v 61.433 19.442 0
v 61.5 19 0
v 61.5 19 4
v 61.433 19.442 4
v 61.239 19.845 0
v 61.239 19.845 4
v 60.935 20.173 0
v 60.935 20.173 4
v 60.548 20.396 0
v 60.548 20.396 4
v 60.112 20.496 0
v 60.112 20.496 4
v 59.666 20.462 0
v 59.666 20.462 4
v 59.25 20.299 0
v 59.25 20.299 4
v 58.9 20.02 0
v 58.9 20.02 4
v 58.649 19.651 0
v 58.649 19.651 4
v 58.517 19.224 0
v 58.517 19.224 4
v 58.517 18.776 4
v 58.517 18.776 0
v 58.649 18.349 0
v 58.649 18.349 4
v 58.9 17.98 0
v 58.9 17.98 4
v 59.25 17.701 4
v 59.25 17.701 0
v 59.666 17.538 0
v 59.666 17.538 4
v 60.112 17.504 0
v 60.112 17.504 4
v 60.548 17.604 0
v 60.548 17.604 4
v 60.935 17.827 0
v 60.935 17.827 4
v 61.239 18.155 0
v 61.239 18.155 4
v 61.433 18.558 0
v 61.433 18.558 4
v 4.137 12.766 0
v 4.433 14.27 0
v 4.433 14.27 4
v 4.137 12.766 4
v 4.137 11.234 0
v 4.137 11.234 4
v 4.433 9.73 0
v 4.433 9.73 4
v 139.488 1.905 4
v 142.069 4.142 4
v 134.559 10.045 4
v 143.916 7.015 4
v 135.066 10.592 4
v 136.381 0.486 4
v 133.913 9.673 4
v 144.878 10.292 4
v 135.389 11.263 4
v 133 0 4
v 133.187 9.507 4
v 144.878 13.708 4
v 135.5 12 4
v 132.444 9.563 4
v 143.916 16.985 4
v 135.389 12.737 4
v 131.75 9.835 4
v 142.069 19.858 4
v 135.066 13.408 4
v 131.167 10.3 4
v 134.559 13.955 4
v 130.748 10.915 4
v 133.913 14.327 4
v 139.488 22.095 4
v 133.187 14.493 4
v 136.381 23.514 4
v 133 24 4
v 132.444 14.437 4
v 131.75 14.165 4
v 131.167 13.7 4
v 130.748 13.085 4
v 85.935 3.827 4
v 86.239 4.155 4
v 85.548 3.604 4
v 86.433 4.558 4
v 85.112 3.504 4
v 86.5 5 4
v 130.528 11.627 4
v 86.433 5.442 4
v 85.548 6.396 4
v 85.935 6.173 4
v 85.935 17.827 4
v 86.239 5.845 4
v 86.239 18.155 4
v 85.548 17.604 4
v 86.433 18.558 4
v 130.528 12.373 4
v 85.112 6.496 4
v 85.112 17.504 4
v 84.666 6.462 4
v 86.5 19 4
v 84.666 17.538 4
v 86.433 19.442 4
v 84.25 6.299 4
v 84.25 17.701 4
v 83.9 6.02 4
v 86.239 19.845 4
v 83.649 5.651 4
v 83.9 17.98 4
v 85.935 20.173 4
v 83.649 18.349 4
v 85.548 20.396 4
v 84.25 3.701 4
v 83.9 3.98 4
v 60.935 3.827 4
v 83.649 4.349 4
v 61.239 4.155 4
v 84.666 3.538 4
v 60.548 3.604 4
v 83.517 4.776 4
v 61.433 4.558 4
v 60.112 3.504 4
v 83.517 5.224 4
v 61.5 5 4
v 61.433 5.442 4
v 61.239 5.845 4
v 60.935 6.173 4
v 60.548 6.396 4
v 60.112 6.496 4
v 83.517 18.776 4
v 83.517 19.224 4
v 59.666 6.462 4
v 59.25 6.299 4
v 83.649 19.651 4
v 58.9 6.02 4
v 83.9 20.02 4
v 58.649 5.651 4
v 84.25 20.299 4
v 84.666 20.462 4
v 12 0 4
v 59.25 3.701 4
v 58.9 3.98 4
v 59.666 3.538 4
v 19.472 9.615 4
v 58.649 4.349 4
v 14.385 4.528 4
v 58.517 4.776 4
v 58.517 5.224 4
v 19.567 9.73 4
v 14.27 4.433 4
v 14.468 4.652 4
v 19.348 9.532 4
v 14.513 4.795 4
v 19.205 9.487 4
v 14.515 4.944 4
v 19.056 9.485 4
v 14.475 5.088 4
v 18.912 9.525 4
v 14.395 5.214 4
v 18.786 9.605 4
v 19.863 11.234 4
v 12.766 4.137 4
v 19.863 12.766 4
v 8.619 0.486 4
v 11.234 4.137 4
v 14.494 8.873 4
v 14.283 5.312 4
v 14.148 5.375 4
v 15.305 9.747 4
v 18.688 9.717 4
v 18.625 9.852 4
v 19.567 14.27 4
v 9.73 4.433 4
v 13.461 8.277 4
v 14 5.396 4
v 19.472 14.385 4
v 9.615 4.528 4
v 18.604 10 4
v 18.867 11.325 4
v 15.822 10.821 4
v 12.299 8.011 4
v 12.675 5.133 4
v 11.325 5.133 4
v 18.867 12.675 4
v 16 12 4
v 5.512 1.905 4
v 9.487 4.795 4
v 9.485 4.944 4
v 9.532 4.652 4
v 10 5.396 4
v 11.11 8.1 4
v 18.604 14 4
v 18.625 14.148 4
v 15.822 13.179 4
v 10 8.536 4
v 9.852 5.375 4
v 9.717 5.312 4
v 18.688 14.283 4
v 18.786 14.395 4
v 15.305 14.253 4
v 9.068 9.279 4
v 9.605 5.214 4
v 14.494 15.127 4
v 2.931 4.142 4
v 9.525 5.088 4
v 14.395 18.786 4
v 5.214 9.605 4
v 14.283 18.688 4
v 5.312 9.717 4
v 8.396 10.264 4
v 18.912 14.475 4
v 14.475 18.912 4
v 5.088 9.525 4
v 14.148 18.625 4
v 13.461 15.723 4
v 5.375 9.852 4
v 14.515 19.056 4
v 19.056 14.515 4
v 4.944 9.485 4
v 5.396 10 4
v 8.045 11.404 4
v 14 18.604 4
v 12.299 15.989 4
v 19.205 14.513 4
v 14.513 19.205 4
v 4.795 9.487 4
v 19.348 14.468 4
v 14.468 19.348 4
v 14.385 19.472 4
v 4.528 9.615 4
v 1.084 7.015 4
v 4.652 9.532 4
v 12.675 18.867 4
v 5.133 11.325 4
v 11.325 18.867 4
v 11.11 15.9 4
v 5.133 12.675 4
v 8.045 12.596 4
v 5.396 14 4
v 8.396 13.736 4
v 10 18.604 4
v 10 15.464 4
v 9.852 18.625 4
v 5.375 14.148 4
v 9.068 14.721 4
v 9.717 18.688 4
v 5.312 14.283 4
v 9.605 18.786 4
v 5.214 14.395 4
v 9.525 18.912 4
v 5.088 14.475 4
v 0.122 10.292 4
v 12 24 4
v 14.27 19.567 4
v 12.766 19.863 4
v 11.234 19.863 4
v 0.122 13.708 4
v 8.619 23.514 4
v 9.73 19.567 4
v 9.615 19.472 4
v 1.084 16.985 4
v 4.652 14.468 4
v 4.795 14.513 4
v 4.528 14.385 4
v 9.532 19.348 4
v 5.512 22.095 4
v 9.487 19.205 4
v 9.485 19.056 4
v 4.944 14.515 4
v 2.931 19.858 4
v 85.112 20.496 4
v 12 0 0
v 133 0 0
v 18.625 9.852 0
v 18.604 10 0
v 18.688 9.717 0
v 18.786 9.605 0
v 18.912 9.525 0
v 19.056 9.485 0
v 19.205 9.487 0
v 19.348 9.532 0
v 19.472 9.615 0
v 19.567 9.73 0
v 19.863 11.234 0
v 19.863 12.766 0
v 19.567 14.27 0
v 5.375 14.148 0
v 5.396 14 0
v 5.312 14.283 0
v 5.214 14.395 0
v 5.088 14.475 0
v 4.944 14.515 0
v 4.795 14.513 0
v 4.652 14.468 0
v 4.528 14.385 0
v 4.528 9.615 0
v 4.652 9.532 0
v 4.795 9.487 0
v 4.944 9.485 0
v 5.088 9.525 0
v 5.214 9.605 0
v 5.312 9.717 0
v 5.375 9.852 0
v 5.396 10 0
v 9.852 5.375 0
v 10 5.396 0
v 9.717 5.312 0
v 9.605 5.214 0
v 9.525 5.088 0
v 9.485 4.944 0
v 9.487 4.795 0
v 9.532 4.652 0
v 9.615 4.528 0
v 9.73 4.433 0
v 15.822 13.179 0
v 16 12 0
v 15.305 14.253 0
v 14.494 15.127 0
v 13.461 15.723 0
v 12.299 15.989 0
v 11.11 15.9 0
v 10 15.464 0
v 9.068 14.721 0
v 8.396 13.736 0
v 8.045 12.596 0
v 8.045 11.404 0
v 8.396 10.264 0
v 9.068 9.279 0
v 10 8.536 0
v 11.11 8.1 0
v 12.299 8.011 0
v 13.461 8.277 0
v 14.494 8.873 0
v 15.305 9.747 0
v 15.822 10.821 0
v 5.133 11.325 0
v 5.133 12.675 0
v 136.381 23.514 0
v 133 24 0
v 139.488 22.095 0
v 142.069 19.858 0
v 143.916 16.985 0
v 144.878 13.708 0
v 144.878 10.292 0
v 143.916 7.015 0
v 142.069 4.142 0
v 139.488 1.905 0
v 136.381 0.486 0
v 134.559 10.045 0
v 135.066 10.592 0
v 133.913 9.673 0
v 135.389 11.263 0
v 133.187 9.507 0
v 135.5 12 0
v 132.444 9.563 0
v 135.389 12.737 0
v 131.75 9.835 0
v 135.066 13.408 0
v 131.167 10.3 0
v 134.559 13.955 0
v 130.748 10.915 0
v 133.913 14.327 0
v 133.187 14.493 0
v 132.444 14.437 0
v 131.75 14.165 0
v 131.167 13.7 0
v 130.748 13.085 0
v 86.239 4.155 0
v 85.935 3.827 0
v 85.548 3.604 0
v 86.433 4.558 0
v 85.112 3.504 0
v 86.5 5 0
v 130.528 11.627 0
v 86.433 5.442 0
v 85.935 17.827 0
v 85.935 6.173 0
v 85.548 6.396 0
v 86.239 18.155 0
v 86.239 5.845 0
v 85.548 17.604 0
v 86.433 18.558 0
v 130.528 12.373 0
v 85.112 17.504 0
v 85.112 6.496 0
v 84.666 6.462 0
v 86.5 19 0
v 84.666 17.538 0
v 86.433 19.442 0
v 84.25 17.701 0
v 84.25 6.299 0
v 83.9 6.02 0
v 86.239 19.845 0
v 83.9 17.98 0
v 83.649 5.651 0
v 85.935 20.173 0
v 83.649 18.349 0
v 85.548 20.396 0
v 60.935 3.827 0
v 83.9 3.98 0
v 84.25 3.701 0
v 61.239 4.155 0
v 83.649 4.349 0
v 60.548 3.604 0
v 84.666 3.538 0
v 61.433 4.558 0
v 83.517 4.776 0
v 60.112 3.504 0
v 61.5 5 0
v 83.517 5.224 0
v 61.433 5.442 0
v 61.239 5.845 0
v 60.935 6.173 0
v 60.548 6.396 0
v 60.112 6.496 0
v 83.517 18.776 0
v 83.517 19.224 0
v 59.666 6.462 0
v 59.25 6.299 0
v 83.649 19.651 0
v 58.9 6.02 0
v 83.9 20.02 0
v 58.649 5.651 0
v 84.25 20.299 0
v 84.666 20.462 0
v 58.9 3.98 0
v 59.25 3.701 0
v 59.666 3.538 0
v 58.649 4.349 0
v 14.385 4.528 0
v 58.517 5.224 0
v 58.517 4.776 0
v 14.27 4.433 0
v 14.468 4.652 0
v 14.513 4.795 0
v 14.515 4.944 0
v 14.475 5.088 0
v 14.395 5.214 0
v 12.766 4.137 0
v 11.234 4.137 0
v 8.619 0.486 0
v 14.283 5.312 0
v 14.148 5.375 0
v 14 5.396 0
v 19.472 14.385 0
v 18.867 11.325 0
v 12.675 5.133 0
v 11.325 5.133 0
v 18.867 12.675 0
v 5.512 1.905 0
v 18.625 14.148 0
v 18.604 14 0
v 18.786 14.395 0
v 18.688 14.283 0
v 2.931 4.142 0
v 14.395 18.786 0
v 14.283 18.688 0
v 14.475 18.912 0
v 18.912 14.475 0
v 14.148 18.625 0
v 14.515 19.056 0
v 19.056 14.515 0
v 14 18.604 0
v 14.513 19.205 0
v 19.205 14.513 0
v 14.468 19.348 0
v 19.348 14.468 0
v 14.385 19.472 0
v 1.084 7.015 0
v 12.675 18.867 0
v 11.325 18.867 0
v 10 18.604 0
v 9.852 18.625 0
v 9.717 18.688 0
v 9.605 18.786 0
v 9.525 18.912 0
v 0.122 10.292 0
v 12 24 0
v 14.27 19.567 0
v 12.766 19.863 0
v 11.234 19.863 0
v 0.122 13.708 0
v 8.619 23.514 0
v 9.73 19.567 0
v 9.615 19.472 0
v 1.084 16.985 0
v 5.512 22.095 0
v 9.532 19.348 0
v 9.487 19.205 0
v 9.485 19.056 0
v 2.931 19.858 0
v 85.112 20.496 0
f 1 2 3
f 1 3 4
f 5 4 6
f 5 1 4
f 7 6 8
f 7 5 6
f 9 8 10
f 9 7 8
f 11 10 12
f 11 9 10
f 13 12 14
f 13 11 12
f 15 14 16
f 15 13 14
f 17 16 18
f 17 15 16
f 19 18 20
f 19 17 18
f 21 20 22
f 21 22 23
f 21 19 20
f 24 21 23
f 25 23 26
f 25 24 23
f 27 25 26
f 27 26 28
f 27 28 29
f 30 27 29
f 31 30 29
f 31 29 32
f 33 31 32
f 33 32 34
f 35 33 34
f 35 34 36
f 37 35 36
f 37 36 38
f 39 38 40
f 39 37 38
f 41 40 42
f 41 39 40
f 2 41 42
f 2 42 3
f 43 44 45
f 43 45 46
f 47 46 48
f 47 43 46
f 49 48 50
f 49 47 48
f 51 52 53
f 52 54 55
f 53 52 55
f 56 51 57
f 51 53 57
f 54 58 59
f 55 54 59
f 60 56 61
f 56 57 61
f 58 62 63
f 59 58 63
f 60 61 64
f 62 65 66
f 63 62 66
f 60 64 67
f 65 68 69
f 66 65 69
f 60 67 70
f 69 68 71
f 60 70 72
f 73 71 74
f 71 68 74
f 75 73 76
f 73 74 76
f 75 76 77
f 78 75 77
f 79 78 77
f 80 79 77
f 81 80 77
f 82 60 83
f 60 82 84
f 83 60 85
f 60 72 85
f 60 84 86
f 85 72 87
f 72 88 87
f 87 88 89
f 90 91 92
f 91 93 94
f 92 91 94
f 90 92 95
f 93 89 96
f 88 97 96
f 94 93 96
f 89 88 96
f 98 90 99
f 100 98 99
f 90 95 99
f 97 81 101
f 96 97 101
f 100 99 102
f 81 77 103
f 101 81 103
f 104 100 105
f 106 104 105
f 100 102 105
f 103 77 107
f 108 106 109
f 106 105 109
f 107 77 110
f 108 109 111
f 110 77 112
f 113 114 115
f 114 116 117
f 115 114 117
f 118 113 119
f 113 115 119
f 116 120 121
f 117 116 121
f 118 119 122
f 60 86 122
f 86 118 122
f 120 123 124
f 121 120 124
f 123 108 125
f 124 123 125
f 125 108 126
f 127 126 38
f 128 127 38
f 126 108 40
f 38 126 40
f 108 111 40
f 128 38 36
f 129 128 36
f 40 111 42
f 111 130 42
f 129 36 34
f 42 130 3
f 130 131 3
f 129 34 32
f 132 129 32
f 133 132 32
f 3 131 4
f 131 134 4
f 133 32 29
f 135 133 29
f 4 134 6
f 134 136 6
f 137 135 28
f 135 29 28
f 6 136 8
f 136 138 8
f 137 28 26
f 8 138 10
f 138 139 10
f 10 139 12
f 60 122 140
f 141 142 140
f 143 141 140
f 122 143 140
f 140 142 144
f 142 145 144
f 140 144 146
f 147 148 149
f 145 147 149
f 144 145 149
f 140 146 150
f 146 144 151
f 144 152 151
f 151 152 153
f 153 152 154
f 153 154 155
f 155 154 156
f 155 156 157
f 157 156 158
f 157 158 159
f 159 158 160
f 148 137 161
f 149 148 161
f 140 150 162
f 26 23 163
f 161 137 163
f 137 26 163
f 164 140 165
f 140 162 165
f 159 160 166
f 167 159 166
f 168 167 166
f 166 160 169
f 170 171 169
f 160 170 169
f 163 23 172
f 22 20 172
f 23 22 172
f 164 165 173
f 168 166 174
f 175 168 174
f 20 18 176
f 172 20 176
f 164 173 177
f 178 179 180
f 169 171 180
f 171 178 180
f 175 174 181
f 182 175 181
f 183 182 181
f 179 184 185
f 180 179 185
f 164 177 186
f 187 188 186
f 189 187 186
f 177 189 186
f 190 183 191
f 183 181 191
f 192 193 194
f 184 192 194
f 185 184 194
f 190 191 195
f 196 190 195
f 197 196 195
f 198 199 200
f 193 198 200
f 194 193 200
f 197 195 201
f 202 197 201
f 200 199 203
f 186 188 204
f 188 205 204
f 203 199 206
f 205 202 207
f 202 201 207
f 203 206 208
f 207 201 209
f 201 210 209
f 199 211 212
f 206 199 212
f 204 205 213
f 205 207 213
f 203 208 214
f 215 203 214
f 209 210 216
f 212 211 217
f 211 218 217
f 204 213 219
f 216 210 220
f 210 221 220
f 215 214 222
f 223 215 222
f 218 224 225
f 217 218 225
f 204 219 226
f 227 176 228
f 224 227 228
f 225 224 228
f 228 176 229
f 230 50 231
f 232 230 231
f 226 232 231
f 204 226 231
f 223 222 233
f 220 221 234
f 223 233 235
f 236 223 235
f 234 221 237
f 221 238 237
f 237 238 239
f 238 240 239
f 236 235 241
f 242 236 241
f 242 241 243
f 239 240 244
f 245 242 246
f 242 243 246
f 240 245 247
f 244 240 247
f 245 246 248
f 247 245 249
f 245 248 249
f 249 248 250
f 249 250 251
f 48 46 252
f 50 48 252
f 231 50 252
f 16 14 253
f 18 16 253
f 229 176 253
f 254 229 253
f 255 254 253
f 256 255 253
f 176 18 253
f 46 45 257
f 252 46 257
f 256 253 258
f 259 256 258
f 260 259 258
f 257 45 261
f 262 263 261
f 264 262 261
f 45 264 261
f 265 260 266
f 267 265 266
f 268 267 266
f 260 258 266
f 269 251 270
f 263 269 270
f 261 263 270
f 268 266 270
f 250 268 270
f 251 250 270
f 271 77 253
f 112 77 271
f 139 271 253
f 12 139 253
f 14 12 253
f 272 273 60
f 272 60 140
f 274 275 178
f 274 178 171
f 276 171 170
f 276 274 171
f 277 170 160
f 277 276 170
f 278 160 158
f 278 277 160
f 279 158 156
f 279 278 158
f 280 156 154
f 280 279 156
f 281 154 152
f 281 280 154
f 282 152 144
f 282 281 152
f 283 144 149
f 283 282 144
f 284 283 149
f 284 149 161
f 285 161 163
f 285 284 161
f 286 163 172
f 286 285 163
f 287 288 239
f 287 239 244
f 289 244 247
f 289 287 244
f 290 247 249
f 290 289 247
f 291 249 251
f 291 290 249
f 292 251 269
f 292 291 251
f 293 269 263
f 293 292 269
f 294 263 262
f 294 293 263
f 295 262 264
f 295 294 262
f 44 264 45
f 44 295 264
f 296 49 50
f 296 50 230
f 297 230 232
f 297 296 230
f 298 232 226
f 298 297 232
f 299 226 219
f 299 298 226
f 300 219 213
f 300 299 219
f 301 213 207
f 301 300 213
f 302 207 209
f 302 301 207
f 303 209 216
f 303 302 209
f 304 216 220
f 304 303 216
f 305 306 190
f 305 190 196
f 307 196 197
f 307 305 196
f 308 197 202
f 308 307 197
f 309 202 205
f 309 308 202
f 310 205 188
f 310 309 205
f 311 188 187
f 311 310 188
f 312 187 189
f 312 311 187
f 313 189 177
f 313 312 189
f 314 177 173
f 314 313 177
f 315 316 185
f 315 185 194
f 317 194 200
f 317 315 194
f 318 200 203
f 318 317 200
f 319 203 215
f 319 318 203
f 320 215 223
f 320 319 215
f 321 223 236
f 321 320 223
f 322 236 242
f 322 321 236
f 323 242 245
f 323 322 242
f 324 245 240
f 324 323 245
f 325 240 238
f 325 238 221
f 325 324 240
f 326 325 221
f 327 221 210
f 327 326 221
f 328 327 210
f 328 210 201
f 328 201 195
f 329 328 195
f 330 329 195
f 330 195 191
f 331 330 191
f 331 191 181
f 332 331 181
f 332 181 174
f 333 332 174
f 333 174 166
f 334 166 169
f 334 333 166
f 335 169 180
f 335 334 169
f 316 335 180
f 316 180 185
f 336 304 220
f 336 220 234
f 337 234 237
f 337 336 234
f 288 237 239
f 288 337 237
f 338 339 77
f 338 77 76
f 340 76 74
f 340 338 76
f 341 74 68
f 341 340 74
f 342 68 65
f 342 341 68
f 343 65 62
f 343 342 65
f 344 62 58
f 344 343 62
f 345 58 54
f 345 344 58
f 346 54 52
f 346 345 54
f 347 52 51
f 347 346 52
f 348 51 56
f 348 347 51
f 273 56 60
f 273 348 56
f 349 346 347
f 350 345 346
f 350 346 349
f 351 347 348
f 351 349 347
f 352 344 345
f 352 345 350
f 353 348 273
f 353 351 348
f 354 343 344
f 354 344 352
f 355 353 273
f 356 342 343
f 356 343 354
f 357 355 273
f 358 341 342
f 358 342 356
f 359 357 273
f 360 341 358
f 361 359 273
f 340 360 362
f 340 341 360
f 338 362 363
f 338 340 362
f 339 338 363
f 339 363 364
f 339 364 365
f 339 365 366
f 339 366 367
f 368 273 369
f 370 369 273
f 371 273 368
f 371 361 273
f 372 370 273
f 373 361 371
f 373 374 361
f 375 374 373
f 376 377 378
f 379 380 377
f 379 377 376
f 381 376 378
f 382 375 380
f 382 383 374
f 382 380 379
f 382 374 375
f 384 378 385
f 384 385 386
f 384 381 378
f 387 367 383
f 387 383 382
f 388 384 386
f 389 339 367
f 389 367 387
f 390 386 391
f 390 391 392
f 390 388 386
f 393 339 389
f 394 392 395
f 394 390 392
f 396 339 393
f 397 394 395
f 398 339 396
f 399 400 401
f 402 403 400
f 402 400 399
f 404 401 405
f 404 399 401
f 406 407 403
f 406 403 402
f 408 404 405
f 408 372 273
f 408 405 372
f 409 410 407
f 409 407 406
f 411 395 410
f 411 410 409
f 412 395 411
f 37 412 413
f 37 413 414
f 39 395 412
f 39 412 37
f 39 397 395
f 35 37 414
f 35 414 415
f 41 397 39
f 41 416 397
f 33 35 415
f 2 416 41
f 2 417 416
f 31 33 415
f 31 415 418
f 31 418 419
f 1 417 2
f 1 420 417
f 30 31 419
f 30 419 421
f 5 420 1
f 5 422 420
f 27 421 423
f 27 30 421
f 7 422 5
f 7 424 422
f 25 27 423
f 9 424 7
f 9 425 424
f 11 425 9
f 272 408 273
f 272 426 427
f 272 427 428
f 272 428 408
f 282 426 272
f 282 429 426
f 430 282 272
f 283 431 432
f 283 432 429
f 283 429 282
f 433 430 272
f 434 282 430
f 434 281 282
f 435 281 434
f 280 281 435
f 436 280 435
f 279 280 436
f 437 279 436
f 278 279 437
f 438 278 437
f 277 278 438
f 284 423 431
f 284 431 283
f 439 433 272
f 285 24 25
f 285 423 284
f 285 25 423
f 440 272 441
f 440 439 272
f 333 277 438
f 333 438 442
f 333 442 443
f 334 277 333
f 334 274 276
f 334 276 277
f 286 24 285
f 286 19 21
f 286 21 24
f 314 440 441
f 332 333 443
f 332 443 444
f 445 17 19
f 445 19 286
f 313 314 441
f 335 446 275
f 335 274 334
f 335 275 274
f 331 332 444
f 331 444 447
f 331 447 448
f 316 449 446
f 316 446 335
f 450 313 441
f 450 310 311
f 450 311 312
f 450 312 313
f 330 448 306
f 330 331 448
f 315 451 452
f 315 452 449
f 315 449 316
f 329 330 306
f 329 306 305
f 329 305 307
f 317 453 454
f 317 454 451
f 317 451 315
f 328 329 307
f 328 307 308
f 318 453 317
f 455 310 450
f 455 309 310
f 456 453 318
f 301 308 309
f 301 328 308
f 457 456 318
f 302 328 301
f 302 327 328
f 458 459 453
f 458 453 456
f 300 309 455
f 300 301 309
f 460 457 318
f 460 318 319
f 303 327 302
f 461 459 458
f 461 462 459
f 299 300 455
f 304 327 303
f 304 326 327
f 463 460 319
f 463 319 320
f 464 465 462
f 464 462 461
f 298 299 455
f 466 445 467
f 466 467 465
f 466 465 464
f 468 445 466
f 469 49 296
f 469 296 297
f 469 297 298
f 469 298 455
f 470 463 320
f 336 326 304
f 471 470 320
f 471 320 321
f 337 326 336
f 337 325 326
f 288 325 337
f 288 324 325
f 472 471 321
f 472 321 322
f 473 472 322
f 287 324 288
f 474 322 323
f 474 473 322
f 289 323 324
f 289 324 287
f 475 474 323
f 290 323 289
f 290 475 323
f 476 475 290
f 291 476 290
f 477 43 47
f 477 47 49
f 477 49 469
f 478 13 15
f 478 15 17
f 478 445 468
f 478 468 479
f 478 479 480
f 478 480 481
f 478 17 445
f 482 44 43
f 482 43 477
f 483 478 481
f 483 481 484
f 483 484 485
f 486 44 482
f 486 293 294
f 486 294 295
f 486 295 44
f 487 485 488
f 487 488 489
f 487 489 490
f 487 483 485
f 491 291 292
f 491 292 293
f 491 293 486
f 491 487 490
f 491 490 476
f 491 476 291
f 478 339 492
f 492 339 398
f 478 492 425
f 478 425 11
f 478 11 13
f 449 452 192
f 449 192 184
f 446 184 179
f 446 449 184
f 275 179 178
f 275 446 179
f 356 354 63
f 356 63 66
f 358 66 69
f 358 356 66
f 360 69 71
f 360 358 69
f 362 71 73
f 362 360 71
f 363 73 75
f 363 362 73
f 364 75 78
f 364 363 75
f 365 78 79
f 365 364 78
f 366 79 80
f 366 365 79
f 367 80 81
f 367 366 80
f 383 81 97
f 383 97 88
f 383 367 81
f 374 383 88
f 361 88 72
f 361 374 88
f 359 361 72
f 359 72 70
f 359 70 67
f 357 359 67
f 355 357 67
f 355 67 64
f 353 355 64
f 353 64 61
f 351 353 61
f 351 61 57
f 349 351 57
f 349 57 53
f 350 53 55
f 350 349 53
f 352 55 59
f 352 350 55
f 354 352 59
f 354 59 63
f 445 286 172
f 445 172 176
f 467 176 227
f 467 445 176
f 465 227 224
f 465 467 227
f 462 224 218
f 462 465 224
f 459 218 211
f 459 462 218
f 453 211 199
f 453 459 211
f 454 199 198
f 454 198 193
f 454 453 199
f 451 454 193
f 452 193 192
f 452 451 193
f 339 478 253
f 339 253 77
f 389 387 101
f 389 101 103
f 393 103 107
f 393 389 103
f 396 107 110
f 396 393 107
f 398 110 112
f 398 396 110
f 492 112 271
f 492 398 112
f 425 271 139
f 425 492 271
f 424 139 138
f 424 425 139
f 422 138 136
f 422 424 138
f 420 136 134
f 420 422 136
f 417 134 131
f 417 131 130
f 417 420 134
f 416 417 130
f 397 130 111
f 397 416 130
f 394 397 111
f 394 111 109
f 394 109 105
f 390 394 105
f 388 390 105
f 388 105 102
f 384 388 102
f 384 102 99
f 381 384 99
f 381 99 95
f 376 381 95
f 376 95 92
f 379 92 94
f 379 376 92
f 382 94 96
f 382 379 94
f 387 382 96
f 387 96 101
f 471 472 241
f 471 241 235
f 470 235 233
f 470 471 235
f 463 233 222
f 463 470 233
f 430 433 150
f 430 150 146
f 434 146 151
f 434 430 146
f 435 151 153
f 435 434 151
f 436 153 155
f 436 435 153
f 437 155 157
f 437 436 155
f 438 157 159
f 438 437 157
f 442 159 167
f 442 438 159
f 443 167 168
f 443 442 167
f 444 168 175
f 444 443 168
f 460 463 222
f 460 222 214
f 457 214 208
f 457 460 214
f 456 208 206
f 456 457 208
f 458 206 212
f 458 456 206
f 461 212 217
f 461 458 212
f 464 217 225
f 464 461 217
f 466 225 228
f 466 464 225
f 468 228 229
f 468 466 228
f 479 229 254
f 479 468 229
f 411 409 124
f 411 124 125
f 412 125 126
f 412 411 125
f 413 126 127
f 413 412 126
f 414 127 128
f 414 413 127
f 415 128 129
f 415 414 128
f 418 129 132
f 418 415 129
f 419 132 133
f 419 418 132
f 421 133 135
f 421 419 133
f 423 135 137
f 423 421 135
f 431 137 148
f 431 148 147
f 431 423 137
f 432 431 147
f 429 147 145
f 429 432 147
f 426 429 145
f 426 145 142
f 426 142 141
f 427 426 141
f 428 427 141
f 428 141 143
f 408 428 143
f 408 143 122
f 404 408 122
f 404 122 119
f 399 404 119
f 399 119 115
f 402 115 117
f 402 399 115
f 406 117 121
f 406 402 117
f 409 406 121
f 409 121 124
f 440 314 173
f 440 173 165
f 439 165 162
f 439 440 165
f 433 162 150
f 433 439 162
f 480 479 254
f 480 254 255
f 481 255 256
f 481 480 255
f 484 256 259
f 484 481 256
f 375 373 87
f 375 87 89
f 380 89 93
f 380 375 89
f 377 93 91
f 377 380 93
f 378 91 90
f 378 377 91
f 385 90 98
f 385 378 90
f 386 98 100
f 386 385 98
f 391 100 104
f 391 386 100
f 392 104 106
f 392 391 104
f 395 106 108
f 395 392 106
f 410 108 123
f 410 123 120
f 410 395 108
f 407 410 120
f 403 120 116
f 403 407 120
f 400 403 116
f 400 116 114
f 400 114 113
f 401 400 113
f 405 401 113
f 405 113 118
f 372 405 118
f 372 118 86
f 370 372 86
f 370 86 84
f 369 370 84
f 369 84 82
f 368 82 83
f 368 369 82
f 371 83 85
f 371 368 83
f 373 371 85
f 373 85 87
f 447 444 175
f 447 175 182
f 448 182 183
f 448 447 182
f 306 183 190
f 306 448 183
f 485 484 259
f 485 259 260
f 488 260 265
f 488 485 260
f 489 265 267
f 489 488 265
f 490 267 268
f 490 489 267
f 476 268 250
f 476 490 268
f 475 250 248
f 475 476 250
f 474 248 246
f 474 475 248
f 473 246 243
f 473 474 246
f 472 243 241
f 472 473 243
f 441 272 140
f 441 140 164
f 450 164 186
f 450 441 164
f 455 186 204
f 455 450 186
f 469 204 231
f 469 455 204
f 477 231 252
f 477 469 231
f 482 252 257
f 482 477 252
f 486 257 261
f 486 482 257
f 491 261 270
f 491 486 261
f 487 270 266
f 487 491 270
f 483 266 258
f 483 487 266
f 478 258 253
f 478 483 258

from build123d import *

# Parameters (mm, degrees)
SKETCH1_R           = 4
SKETCH1_R_2         = 1.5
SKETCH1_R_3         = 2.5
BOSS_EXTRUDE1_DEPTH = 4


with BuildPart() as part:
    # Sketch1 → Boss-Extrude1 (new body)
    with BuildSketch(Plane.XY):
        with BuildLine():
            Line((12.000000461, 24.00000011), (133.000000461, 24.00000011))
            ThreePointArc((133.000000461, 24.00000011), (145.000000461, 12.00000011), (133.000000461, 1.1e-07))
            Line((133.000000461, 1.1e-07), (12.000000461, 1.1e-07))
            ThreePointArc((12.000000461, 1.1e-07), (4.61e-07, 12.00000011), (12.000000461, 24.00000011))
        make_face()
        with Locations((12.000000461, 12.00000011)):
            Circle(SKETCH1_R, mode=Mode.SUBTRACT)
        with Locations((60.000000461, 5.00000011)):
            Circle(SKETCH1_R_2, mode=Mode.SUBTRACT)
        with Locations((60.000000461, 19.00000011)):
            Circle(SKETCH1_R_2, mode=Mode.SUBTRACT)
        with Locations((85.000000461, 5.00000011)):
            Circle(SKETCH1_R_2, mode=Mode.SUBTRACT)
        with Locations((85.000000461, 19.00000011)):
            Circle(SKETCH1_R_2, mode=Mode.SUBTRACT)
        with Locations((133.000000461, 12.00000011)):
            Circle(SKETCH1_R_3, mode=Mode.SUBTRACT)
        with BuildLine():
            ThreePointArc((9.729668922, 4.433322836), (12.000000461, 4.100062751), (14.270331999, 4.433322836))
            ThreePointArc((14.270331999, 4.433322836), (14.500023689, 5.017172326), (14.000000461, 5.396138381))
            ThreePointArc((14.000000461, 5.396138381), (12.000000461, 5.09992839), (10.000000461, 5.396138381))
            ThreePointArc((10.000000461, 5.396138381), (9.499977232, 5.017172326), (9.729668922, 4.433322836))
        make_face(mode=Mode.SUBTRACT)
        with BuildLine():
            ThreePointArc((19.566677735, 9.729668571), (19.899937819, 12.00000011), (19.566677735, 14.270331648))
            ThreePointArc((19.566677735, 14.270331648), (18.982828244, 14.500023338), (18.603862189, 14.00000011))
            ThreePointArc((18.603862189, 14.00000011), (18.90007218, 12.00000011), (18.603862189, 10.00000011))
            ThreePointArc((18.603862189, 10.00000011), (18.982828244, 9.499976882), (19.566677735, 9.729668571))
        make_face(mode=Mode.SUBTRACT)
        with BuildLine():
            ThreePointArc((14.270331999, 19.566677384), (12.000000461, 19.899937468), (9.729668922, 19.566677384))
            ThreePointArc((9.729668922, 19.566677384), (9.499977232, 18.982827894), (10.000000461, 18.603861839))
            ThreePointArc((10.000000461, 18.603861839), (12.000000461, 18.900071829), (14.000000461, 18.603861839))
            ThreePointArc((14.000000461, 18.603861839), (14.500023689, 18.982827894), (14.270331999, 19.566677384))
        make_face(mode=Mode.SUBTRACT)
        with BuildLine():
            ThreePointArc((4.433323186, 14.270331648), (4.100063102, 12.00000011), (4.433323186, 9.729668571))
            ThreePointArc((4.433323186, 9.729668571), (5.017172677, 9.499976882), (5.396138732, 10.00000011))
            ThreePointArc((5.396138732, 10.00000011), (5.099928741, 12.00000011), (5.396138732, 14.00000011))
            ThreePointArc((5.396138732, 14.00000011), (5.017172677, 14.500023338), (4.433323186, 14.270331648))
        make_face(mode=Mode.SUBTRACT)
    extrude(amount=BOSS_EXTRUDE1_DEPTH)


solid = part.part
